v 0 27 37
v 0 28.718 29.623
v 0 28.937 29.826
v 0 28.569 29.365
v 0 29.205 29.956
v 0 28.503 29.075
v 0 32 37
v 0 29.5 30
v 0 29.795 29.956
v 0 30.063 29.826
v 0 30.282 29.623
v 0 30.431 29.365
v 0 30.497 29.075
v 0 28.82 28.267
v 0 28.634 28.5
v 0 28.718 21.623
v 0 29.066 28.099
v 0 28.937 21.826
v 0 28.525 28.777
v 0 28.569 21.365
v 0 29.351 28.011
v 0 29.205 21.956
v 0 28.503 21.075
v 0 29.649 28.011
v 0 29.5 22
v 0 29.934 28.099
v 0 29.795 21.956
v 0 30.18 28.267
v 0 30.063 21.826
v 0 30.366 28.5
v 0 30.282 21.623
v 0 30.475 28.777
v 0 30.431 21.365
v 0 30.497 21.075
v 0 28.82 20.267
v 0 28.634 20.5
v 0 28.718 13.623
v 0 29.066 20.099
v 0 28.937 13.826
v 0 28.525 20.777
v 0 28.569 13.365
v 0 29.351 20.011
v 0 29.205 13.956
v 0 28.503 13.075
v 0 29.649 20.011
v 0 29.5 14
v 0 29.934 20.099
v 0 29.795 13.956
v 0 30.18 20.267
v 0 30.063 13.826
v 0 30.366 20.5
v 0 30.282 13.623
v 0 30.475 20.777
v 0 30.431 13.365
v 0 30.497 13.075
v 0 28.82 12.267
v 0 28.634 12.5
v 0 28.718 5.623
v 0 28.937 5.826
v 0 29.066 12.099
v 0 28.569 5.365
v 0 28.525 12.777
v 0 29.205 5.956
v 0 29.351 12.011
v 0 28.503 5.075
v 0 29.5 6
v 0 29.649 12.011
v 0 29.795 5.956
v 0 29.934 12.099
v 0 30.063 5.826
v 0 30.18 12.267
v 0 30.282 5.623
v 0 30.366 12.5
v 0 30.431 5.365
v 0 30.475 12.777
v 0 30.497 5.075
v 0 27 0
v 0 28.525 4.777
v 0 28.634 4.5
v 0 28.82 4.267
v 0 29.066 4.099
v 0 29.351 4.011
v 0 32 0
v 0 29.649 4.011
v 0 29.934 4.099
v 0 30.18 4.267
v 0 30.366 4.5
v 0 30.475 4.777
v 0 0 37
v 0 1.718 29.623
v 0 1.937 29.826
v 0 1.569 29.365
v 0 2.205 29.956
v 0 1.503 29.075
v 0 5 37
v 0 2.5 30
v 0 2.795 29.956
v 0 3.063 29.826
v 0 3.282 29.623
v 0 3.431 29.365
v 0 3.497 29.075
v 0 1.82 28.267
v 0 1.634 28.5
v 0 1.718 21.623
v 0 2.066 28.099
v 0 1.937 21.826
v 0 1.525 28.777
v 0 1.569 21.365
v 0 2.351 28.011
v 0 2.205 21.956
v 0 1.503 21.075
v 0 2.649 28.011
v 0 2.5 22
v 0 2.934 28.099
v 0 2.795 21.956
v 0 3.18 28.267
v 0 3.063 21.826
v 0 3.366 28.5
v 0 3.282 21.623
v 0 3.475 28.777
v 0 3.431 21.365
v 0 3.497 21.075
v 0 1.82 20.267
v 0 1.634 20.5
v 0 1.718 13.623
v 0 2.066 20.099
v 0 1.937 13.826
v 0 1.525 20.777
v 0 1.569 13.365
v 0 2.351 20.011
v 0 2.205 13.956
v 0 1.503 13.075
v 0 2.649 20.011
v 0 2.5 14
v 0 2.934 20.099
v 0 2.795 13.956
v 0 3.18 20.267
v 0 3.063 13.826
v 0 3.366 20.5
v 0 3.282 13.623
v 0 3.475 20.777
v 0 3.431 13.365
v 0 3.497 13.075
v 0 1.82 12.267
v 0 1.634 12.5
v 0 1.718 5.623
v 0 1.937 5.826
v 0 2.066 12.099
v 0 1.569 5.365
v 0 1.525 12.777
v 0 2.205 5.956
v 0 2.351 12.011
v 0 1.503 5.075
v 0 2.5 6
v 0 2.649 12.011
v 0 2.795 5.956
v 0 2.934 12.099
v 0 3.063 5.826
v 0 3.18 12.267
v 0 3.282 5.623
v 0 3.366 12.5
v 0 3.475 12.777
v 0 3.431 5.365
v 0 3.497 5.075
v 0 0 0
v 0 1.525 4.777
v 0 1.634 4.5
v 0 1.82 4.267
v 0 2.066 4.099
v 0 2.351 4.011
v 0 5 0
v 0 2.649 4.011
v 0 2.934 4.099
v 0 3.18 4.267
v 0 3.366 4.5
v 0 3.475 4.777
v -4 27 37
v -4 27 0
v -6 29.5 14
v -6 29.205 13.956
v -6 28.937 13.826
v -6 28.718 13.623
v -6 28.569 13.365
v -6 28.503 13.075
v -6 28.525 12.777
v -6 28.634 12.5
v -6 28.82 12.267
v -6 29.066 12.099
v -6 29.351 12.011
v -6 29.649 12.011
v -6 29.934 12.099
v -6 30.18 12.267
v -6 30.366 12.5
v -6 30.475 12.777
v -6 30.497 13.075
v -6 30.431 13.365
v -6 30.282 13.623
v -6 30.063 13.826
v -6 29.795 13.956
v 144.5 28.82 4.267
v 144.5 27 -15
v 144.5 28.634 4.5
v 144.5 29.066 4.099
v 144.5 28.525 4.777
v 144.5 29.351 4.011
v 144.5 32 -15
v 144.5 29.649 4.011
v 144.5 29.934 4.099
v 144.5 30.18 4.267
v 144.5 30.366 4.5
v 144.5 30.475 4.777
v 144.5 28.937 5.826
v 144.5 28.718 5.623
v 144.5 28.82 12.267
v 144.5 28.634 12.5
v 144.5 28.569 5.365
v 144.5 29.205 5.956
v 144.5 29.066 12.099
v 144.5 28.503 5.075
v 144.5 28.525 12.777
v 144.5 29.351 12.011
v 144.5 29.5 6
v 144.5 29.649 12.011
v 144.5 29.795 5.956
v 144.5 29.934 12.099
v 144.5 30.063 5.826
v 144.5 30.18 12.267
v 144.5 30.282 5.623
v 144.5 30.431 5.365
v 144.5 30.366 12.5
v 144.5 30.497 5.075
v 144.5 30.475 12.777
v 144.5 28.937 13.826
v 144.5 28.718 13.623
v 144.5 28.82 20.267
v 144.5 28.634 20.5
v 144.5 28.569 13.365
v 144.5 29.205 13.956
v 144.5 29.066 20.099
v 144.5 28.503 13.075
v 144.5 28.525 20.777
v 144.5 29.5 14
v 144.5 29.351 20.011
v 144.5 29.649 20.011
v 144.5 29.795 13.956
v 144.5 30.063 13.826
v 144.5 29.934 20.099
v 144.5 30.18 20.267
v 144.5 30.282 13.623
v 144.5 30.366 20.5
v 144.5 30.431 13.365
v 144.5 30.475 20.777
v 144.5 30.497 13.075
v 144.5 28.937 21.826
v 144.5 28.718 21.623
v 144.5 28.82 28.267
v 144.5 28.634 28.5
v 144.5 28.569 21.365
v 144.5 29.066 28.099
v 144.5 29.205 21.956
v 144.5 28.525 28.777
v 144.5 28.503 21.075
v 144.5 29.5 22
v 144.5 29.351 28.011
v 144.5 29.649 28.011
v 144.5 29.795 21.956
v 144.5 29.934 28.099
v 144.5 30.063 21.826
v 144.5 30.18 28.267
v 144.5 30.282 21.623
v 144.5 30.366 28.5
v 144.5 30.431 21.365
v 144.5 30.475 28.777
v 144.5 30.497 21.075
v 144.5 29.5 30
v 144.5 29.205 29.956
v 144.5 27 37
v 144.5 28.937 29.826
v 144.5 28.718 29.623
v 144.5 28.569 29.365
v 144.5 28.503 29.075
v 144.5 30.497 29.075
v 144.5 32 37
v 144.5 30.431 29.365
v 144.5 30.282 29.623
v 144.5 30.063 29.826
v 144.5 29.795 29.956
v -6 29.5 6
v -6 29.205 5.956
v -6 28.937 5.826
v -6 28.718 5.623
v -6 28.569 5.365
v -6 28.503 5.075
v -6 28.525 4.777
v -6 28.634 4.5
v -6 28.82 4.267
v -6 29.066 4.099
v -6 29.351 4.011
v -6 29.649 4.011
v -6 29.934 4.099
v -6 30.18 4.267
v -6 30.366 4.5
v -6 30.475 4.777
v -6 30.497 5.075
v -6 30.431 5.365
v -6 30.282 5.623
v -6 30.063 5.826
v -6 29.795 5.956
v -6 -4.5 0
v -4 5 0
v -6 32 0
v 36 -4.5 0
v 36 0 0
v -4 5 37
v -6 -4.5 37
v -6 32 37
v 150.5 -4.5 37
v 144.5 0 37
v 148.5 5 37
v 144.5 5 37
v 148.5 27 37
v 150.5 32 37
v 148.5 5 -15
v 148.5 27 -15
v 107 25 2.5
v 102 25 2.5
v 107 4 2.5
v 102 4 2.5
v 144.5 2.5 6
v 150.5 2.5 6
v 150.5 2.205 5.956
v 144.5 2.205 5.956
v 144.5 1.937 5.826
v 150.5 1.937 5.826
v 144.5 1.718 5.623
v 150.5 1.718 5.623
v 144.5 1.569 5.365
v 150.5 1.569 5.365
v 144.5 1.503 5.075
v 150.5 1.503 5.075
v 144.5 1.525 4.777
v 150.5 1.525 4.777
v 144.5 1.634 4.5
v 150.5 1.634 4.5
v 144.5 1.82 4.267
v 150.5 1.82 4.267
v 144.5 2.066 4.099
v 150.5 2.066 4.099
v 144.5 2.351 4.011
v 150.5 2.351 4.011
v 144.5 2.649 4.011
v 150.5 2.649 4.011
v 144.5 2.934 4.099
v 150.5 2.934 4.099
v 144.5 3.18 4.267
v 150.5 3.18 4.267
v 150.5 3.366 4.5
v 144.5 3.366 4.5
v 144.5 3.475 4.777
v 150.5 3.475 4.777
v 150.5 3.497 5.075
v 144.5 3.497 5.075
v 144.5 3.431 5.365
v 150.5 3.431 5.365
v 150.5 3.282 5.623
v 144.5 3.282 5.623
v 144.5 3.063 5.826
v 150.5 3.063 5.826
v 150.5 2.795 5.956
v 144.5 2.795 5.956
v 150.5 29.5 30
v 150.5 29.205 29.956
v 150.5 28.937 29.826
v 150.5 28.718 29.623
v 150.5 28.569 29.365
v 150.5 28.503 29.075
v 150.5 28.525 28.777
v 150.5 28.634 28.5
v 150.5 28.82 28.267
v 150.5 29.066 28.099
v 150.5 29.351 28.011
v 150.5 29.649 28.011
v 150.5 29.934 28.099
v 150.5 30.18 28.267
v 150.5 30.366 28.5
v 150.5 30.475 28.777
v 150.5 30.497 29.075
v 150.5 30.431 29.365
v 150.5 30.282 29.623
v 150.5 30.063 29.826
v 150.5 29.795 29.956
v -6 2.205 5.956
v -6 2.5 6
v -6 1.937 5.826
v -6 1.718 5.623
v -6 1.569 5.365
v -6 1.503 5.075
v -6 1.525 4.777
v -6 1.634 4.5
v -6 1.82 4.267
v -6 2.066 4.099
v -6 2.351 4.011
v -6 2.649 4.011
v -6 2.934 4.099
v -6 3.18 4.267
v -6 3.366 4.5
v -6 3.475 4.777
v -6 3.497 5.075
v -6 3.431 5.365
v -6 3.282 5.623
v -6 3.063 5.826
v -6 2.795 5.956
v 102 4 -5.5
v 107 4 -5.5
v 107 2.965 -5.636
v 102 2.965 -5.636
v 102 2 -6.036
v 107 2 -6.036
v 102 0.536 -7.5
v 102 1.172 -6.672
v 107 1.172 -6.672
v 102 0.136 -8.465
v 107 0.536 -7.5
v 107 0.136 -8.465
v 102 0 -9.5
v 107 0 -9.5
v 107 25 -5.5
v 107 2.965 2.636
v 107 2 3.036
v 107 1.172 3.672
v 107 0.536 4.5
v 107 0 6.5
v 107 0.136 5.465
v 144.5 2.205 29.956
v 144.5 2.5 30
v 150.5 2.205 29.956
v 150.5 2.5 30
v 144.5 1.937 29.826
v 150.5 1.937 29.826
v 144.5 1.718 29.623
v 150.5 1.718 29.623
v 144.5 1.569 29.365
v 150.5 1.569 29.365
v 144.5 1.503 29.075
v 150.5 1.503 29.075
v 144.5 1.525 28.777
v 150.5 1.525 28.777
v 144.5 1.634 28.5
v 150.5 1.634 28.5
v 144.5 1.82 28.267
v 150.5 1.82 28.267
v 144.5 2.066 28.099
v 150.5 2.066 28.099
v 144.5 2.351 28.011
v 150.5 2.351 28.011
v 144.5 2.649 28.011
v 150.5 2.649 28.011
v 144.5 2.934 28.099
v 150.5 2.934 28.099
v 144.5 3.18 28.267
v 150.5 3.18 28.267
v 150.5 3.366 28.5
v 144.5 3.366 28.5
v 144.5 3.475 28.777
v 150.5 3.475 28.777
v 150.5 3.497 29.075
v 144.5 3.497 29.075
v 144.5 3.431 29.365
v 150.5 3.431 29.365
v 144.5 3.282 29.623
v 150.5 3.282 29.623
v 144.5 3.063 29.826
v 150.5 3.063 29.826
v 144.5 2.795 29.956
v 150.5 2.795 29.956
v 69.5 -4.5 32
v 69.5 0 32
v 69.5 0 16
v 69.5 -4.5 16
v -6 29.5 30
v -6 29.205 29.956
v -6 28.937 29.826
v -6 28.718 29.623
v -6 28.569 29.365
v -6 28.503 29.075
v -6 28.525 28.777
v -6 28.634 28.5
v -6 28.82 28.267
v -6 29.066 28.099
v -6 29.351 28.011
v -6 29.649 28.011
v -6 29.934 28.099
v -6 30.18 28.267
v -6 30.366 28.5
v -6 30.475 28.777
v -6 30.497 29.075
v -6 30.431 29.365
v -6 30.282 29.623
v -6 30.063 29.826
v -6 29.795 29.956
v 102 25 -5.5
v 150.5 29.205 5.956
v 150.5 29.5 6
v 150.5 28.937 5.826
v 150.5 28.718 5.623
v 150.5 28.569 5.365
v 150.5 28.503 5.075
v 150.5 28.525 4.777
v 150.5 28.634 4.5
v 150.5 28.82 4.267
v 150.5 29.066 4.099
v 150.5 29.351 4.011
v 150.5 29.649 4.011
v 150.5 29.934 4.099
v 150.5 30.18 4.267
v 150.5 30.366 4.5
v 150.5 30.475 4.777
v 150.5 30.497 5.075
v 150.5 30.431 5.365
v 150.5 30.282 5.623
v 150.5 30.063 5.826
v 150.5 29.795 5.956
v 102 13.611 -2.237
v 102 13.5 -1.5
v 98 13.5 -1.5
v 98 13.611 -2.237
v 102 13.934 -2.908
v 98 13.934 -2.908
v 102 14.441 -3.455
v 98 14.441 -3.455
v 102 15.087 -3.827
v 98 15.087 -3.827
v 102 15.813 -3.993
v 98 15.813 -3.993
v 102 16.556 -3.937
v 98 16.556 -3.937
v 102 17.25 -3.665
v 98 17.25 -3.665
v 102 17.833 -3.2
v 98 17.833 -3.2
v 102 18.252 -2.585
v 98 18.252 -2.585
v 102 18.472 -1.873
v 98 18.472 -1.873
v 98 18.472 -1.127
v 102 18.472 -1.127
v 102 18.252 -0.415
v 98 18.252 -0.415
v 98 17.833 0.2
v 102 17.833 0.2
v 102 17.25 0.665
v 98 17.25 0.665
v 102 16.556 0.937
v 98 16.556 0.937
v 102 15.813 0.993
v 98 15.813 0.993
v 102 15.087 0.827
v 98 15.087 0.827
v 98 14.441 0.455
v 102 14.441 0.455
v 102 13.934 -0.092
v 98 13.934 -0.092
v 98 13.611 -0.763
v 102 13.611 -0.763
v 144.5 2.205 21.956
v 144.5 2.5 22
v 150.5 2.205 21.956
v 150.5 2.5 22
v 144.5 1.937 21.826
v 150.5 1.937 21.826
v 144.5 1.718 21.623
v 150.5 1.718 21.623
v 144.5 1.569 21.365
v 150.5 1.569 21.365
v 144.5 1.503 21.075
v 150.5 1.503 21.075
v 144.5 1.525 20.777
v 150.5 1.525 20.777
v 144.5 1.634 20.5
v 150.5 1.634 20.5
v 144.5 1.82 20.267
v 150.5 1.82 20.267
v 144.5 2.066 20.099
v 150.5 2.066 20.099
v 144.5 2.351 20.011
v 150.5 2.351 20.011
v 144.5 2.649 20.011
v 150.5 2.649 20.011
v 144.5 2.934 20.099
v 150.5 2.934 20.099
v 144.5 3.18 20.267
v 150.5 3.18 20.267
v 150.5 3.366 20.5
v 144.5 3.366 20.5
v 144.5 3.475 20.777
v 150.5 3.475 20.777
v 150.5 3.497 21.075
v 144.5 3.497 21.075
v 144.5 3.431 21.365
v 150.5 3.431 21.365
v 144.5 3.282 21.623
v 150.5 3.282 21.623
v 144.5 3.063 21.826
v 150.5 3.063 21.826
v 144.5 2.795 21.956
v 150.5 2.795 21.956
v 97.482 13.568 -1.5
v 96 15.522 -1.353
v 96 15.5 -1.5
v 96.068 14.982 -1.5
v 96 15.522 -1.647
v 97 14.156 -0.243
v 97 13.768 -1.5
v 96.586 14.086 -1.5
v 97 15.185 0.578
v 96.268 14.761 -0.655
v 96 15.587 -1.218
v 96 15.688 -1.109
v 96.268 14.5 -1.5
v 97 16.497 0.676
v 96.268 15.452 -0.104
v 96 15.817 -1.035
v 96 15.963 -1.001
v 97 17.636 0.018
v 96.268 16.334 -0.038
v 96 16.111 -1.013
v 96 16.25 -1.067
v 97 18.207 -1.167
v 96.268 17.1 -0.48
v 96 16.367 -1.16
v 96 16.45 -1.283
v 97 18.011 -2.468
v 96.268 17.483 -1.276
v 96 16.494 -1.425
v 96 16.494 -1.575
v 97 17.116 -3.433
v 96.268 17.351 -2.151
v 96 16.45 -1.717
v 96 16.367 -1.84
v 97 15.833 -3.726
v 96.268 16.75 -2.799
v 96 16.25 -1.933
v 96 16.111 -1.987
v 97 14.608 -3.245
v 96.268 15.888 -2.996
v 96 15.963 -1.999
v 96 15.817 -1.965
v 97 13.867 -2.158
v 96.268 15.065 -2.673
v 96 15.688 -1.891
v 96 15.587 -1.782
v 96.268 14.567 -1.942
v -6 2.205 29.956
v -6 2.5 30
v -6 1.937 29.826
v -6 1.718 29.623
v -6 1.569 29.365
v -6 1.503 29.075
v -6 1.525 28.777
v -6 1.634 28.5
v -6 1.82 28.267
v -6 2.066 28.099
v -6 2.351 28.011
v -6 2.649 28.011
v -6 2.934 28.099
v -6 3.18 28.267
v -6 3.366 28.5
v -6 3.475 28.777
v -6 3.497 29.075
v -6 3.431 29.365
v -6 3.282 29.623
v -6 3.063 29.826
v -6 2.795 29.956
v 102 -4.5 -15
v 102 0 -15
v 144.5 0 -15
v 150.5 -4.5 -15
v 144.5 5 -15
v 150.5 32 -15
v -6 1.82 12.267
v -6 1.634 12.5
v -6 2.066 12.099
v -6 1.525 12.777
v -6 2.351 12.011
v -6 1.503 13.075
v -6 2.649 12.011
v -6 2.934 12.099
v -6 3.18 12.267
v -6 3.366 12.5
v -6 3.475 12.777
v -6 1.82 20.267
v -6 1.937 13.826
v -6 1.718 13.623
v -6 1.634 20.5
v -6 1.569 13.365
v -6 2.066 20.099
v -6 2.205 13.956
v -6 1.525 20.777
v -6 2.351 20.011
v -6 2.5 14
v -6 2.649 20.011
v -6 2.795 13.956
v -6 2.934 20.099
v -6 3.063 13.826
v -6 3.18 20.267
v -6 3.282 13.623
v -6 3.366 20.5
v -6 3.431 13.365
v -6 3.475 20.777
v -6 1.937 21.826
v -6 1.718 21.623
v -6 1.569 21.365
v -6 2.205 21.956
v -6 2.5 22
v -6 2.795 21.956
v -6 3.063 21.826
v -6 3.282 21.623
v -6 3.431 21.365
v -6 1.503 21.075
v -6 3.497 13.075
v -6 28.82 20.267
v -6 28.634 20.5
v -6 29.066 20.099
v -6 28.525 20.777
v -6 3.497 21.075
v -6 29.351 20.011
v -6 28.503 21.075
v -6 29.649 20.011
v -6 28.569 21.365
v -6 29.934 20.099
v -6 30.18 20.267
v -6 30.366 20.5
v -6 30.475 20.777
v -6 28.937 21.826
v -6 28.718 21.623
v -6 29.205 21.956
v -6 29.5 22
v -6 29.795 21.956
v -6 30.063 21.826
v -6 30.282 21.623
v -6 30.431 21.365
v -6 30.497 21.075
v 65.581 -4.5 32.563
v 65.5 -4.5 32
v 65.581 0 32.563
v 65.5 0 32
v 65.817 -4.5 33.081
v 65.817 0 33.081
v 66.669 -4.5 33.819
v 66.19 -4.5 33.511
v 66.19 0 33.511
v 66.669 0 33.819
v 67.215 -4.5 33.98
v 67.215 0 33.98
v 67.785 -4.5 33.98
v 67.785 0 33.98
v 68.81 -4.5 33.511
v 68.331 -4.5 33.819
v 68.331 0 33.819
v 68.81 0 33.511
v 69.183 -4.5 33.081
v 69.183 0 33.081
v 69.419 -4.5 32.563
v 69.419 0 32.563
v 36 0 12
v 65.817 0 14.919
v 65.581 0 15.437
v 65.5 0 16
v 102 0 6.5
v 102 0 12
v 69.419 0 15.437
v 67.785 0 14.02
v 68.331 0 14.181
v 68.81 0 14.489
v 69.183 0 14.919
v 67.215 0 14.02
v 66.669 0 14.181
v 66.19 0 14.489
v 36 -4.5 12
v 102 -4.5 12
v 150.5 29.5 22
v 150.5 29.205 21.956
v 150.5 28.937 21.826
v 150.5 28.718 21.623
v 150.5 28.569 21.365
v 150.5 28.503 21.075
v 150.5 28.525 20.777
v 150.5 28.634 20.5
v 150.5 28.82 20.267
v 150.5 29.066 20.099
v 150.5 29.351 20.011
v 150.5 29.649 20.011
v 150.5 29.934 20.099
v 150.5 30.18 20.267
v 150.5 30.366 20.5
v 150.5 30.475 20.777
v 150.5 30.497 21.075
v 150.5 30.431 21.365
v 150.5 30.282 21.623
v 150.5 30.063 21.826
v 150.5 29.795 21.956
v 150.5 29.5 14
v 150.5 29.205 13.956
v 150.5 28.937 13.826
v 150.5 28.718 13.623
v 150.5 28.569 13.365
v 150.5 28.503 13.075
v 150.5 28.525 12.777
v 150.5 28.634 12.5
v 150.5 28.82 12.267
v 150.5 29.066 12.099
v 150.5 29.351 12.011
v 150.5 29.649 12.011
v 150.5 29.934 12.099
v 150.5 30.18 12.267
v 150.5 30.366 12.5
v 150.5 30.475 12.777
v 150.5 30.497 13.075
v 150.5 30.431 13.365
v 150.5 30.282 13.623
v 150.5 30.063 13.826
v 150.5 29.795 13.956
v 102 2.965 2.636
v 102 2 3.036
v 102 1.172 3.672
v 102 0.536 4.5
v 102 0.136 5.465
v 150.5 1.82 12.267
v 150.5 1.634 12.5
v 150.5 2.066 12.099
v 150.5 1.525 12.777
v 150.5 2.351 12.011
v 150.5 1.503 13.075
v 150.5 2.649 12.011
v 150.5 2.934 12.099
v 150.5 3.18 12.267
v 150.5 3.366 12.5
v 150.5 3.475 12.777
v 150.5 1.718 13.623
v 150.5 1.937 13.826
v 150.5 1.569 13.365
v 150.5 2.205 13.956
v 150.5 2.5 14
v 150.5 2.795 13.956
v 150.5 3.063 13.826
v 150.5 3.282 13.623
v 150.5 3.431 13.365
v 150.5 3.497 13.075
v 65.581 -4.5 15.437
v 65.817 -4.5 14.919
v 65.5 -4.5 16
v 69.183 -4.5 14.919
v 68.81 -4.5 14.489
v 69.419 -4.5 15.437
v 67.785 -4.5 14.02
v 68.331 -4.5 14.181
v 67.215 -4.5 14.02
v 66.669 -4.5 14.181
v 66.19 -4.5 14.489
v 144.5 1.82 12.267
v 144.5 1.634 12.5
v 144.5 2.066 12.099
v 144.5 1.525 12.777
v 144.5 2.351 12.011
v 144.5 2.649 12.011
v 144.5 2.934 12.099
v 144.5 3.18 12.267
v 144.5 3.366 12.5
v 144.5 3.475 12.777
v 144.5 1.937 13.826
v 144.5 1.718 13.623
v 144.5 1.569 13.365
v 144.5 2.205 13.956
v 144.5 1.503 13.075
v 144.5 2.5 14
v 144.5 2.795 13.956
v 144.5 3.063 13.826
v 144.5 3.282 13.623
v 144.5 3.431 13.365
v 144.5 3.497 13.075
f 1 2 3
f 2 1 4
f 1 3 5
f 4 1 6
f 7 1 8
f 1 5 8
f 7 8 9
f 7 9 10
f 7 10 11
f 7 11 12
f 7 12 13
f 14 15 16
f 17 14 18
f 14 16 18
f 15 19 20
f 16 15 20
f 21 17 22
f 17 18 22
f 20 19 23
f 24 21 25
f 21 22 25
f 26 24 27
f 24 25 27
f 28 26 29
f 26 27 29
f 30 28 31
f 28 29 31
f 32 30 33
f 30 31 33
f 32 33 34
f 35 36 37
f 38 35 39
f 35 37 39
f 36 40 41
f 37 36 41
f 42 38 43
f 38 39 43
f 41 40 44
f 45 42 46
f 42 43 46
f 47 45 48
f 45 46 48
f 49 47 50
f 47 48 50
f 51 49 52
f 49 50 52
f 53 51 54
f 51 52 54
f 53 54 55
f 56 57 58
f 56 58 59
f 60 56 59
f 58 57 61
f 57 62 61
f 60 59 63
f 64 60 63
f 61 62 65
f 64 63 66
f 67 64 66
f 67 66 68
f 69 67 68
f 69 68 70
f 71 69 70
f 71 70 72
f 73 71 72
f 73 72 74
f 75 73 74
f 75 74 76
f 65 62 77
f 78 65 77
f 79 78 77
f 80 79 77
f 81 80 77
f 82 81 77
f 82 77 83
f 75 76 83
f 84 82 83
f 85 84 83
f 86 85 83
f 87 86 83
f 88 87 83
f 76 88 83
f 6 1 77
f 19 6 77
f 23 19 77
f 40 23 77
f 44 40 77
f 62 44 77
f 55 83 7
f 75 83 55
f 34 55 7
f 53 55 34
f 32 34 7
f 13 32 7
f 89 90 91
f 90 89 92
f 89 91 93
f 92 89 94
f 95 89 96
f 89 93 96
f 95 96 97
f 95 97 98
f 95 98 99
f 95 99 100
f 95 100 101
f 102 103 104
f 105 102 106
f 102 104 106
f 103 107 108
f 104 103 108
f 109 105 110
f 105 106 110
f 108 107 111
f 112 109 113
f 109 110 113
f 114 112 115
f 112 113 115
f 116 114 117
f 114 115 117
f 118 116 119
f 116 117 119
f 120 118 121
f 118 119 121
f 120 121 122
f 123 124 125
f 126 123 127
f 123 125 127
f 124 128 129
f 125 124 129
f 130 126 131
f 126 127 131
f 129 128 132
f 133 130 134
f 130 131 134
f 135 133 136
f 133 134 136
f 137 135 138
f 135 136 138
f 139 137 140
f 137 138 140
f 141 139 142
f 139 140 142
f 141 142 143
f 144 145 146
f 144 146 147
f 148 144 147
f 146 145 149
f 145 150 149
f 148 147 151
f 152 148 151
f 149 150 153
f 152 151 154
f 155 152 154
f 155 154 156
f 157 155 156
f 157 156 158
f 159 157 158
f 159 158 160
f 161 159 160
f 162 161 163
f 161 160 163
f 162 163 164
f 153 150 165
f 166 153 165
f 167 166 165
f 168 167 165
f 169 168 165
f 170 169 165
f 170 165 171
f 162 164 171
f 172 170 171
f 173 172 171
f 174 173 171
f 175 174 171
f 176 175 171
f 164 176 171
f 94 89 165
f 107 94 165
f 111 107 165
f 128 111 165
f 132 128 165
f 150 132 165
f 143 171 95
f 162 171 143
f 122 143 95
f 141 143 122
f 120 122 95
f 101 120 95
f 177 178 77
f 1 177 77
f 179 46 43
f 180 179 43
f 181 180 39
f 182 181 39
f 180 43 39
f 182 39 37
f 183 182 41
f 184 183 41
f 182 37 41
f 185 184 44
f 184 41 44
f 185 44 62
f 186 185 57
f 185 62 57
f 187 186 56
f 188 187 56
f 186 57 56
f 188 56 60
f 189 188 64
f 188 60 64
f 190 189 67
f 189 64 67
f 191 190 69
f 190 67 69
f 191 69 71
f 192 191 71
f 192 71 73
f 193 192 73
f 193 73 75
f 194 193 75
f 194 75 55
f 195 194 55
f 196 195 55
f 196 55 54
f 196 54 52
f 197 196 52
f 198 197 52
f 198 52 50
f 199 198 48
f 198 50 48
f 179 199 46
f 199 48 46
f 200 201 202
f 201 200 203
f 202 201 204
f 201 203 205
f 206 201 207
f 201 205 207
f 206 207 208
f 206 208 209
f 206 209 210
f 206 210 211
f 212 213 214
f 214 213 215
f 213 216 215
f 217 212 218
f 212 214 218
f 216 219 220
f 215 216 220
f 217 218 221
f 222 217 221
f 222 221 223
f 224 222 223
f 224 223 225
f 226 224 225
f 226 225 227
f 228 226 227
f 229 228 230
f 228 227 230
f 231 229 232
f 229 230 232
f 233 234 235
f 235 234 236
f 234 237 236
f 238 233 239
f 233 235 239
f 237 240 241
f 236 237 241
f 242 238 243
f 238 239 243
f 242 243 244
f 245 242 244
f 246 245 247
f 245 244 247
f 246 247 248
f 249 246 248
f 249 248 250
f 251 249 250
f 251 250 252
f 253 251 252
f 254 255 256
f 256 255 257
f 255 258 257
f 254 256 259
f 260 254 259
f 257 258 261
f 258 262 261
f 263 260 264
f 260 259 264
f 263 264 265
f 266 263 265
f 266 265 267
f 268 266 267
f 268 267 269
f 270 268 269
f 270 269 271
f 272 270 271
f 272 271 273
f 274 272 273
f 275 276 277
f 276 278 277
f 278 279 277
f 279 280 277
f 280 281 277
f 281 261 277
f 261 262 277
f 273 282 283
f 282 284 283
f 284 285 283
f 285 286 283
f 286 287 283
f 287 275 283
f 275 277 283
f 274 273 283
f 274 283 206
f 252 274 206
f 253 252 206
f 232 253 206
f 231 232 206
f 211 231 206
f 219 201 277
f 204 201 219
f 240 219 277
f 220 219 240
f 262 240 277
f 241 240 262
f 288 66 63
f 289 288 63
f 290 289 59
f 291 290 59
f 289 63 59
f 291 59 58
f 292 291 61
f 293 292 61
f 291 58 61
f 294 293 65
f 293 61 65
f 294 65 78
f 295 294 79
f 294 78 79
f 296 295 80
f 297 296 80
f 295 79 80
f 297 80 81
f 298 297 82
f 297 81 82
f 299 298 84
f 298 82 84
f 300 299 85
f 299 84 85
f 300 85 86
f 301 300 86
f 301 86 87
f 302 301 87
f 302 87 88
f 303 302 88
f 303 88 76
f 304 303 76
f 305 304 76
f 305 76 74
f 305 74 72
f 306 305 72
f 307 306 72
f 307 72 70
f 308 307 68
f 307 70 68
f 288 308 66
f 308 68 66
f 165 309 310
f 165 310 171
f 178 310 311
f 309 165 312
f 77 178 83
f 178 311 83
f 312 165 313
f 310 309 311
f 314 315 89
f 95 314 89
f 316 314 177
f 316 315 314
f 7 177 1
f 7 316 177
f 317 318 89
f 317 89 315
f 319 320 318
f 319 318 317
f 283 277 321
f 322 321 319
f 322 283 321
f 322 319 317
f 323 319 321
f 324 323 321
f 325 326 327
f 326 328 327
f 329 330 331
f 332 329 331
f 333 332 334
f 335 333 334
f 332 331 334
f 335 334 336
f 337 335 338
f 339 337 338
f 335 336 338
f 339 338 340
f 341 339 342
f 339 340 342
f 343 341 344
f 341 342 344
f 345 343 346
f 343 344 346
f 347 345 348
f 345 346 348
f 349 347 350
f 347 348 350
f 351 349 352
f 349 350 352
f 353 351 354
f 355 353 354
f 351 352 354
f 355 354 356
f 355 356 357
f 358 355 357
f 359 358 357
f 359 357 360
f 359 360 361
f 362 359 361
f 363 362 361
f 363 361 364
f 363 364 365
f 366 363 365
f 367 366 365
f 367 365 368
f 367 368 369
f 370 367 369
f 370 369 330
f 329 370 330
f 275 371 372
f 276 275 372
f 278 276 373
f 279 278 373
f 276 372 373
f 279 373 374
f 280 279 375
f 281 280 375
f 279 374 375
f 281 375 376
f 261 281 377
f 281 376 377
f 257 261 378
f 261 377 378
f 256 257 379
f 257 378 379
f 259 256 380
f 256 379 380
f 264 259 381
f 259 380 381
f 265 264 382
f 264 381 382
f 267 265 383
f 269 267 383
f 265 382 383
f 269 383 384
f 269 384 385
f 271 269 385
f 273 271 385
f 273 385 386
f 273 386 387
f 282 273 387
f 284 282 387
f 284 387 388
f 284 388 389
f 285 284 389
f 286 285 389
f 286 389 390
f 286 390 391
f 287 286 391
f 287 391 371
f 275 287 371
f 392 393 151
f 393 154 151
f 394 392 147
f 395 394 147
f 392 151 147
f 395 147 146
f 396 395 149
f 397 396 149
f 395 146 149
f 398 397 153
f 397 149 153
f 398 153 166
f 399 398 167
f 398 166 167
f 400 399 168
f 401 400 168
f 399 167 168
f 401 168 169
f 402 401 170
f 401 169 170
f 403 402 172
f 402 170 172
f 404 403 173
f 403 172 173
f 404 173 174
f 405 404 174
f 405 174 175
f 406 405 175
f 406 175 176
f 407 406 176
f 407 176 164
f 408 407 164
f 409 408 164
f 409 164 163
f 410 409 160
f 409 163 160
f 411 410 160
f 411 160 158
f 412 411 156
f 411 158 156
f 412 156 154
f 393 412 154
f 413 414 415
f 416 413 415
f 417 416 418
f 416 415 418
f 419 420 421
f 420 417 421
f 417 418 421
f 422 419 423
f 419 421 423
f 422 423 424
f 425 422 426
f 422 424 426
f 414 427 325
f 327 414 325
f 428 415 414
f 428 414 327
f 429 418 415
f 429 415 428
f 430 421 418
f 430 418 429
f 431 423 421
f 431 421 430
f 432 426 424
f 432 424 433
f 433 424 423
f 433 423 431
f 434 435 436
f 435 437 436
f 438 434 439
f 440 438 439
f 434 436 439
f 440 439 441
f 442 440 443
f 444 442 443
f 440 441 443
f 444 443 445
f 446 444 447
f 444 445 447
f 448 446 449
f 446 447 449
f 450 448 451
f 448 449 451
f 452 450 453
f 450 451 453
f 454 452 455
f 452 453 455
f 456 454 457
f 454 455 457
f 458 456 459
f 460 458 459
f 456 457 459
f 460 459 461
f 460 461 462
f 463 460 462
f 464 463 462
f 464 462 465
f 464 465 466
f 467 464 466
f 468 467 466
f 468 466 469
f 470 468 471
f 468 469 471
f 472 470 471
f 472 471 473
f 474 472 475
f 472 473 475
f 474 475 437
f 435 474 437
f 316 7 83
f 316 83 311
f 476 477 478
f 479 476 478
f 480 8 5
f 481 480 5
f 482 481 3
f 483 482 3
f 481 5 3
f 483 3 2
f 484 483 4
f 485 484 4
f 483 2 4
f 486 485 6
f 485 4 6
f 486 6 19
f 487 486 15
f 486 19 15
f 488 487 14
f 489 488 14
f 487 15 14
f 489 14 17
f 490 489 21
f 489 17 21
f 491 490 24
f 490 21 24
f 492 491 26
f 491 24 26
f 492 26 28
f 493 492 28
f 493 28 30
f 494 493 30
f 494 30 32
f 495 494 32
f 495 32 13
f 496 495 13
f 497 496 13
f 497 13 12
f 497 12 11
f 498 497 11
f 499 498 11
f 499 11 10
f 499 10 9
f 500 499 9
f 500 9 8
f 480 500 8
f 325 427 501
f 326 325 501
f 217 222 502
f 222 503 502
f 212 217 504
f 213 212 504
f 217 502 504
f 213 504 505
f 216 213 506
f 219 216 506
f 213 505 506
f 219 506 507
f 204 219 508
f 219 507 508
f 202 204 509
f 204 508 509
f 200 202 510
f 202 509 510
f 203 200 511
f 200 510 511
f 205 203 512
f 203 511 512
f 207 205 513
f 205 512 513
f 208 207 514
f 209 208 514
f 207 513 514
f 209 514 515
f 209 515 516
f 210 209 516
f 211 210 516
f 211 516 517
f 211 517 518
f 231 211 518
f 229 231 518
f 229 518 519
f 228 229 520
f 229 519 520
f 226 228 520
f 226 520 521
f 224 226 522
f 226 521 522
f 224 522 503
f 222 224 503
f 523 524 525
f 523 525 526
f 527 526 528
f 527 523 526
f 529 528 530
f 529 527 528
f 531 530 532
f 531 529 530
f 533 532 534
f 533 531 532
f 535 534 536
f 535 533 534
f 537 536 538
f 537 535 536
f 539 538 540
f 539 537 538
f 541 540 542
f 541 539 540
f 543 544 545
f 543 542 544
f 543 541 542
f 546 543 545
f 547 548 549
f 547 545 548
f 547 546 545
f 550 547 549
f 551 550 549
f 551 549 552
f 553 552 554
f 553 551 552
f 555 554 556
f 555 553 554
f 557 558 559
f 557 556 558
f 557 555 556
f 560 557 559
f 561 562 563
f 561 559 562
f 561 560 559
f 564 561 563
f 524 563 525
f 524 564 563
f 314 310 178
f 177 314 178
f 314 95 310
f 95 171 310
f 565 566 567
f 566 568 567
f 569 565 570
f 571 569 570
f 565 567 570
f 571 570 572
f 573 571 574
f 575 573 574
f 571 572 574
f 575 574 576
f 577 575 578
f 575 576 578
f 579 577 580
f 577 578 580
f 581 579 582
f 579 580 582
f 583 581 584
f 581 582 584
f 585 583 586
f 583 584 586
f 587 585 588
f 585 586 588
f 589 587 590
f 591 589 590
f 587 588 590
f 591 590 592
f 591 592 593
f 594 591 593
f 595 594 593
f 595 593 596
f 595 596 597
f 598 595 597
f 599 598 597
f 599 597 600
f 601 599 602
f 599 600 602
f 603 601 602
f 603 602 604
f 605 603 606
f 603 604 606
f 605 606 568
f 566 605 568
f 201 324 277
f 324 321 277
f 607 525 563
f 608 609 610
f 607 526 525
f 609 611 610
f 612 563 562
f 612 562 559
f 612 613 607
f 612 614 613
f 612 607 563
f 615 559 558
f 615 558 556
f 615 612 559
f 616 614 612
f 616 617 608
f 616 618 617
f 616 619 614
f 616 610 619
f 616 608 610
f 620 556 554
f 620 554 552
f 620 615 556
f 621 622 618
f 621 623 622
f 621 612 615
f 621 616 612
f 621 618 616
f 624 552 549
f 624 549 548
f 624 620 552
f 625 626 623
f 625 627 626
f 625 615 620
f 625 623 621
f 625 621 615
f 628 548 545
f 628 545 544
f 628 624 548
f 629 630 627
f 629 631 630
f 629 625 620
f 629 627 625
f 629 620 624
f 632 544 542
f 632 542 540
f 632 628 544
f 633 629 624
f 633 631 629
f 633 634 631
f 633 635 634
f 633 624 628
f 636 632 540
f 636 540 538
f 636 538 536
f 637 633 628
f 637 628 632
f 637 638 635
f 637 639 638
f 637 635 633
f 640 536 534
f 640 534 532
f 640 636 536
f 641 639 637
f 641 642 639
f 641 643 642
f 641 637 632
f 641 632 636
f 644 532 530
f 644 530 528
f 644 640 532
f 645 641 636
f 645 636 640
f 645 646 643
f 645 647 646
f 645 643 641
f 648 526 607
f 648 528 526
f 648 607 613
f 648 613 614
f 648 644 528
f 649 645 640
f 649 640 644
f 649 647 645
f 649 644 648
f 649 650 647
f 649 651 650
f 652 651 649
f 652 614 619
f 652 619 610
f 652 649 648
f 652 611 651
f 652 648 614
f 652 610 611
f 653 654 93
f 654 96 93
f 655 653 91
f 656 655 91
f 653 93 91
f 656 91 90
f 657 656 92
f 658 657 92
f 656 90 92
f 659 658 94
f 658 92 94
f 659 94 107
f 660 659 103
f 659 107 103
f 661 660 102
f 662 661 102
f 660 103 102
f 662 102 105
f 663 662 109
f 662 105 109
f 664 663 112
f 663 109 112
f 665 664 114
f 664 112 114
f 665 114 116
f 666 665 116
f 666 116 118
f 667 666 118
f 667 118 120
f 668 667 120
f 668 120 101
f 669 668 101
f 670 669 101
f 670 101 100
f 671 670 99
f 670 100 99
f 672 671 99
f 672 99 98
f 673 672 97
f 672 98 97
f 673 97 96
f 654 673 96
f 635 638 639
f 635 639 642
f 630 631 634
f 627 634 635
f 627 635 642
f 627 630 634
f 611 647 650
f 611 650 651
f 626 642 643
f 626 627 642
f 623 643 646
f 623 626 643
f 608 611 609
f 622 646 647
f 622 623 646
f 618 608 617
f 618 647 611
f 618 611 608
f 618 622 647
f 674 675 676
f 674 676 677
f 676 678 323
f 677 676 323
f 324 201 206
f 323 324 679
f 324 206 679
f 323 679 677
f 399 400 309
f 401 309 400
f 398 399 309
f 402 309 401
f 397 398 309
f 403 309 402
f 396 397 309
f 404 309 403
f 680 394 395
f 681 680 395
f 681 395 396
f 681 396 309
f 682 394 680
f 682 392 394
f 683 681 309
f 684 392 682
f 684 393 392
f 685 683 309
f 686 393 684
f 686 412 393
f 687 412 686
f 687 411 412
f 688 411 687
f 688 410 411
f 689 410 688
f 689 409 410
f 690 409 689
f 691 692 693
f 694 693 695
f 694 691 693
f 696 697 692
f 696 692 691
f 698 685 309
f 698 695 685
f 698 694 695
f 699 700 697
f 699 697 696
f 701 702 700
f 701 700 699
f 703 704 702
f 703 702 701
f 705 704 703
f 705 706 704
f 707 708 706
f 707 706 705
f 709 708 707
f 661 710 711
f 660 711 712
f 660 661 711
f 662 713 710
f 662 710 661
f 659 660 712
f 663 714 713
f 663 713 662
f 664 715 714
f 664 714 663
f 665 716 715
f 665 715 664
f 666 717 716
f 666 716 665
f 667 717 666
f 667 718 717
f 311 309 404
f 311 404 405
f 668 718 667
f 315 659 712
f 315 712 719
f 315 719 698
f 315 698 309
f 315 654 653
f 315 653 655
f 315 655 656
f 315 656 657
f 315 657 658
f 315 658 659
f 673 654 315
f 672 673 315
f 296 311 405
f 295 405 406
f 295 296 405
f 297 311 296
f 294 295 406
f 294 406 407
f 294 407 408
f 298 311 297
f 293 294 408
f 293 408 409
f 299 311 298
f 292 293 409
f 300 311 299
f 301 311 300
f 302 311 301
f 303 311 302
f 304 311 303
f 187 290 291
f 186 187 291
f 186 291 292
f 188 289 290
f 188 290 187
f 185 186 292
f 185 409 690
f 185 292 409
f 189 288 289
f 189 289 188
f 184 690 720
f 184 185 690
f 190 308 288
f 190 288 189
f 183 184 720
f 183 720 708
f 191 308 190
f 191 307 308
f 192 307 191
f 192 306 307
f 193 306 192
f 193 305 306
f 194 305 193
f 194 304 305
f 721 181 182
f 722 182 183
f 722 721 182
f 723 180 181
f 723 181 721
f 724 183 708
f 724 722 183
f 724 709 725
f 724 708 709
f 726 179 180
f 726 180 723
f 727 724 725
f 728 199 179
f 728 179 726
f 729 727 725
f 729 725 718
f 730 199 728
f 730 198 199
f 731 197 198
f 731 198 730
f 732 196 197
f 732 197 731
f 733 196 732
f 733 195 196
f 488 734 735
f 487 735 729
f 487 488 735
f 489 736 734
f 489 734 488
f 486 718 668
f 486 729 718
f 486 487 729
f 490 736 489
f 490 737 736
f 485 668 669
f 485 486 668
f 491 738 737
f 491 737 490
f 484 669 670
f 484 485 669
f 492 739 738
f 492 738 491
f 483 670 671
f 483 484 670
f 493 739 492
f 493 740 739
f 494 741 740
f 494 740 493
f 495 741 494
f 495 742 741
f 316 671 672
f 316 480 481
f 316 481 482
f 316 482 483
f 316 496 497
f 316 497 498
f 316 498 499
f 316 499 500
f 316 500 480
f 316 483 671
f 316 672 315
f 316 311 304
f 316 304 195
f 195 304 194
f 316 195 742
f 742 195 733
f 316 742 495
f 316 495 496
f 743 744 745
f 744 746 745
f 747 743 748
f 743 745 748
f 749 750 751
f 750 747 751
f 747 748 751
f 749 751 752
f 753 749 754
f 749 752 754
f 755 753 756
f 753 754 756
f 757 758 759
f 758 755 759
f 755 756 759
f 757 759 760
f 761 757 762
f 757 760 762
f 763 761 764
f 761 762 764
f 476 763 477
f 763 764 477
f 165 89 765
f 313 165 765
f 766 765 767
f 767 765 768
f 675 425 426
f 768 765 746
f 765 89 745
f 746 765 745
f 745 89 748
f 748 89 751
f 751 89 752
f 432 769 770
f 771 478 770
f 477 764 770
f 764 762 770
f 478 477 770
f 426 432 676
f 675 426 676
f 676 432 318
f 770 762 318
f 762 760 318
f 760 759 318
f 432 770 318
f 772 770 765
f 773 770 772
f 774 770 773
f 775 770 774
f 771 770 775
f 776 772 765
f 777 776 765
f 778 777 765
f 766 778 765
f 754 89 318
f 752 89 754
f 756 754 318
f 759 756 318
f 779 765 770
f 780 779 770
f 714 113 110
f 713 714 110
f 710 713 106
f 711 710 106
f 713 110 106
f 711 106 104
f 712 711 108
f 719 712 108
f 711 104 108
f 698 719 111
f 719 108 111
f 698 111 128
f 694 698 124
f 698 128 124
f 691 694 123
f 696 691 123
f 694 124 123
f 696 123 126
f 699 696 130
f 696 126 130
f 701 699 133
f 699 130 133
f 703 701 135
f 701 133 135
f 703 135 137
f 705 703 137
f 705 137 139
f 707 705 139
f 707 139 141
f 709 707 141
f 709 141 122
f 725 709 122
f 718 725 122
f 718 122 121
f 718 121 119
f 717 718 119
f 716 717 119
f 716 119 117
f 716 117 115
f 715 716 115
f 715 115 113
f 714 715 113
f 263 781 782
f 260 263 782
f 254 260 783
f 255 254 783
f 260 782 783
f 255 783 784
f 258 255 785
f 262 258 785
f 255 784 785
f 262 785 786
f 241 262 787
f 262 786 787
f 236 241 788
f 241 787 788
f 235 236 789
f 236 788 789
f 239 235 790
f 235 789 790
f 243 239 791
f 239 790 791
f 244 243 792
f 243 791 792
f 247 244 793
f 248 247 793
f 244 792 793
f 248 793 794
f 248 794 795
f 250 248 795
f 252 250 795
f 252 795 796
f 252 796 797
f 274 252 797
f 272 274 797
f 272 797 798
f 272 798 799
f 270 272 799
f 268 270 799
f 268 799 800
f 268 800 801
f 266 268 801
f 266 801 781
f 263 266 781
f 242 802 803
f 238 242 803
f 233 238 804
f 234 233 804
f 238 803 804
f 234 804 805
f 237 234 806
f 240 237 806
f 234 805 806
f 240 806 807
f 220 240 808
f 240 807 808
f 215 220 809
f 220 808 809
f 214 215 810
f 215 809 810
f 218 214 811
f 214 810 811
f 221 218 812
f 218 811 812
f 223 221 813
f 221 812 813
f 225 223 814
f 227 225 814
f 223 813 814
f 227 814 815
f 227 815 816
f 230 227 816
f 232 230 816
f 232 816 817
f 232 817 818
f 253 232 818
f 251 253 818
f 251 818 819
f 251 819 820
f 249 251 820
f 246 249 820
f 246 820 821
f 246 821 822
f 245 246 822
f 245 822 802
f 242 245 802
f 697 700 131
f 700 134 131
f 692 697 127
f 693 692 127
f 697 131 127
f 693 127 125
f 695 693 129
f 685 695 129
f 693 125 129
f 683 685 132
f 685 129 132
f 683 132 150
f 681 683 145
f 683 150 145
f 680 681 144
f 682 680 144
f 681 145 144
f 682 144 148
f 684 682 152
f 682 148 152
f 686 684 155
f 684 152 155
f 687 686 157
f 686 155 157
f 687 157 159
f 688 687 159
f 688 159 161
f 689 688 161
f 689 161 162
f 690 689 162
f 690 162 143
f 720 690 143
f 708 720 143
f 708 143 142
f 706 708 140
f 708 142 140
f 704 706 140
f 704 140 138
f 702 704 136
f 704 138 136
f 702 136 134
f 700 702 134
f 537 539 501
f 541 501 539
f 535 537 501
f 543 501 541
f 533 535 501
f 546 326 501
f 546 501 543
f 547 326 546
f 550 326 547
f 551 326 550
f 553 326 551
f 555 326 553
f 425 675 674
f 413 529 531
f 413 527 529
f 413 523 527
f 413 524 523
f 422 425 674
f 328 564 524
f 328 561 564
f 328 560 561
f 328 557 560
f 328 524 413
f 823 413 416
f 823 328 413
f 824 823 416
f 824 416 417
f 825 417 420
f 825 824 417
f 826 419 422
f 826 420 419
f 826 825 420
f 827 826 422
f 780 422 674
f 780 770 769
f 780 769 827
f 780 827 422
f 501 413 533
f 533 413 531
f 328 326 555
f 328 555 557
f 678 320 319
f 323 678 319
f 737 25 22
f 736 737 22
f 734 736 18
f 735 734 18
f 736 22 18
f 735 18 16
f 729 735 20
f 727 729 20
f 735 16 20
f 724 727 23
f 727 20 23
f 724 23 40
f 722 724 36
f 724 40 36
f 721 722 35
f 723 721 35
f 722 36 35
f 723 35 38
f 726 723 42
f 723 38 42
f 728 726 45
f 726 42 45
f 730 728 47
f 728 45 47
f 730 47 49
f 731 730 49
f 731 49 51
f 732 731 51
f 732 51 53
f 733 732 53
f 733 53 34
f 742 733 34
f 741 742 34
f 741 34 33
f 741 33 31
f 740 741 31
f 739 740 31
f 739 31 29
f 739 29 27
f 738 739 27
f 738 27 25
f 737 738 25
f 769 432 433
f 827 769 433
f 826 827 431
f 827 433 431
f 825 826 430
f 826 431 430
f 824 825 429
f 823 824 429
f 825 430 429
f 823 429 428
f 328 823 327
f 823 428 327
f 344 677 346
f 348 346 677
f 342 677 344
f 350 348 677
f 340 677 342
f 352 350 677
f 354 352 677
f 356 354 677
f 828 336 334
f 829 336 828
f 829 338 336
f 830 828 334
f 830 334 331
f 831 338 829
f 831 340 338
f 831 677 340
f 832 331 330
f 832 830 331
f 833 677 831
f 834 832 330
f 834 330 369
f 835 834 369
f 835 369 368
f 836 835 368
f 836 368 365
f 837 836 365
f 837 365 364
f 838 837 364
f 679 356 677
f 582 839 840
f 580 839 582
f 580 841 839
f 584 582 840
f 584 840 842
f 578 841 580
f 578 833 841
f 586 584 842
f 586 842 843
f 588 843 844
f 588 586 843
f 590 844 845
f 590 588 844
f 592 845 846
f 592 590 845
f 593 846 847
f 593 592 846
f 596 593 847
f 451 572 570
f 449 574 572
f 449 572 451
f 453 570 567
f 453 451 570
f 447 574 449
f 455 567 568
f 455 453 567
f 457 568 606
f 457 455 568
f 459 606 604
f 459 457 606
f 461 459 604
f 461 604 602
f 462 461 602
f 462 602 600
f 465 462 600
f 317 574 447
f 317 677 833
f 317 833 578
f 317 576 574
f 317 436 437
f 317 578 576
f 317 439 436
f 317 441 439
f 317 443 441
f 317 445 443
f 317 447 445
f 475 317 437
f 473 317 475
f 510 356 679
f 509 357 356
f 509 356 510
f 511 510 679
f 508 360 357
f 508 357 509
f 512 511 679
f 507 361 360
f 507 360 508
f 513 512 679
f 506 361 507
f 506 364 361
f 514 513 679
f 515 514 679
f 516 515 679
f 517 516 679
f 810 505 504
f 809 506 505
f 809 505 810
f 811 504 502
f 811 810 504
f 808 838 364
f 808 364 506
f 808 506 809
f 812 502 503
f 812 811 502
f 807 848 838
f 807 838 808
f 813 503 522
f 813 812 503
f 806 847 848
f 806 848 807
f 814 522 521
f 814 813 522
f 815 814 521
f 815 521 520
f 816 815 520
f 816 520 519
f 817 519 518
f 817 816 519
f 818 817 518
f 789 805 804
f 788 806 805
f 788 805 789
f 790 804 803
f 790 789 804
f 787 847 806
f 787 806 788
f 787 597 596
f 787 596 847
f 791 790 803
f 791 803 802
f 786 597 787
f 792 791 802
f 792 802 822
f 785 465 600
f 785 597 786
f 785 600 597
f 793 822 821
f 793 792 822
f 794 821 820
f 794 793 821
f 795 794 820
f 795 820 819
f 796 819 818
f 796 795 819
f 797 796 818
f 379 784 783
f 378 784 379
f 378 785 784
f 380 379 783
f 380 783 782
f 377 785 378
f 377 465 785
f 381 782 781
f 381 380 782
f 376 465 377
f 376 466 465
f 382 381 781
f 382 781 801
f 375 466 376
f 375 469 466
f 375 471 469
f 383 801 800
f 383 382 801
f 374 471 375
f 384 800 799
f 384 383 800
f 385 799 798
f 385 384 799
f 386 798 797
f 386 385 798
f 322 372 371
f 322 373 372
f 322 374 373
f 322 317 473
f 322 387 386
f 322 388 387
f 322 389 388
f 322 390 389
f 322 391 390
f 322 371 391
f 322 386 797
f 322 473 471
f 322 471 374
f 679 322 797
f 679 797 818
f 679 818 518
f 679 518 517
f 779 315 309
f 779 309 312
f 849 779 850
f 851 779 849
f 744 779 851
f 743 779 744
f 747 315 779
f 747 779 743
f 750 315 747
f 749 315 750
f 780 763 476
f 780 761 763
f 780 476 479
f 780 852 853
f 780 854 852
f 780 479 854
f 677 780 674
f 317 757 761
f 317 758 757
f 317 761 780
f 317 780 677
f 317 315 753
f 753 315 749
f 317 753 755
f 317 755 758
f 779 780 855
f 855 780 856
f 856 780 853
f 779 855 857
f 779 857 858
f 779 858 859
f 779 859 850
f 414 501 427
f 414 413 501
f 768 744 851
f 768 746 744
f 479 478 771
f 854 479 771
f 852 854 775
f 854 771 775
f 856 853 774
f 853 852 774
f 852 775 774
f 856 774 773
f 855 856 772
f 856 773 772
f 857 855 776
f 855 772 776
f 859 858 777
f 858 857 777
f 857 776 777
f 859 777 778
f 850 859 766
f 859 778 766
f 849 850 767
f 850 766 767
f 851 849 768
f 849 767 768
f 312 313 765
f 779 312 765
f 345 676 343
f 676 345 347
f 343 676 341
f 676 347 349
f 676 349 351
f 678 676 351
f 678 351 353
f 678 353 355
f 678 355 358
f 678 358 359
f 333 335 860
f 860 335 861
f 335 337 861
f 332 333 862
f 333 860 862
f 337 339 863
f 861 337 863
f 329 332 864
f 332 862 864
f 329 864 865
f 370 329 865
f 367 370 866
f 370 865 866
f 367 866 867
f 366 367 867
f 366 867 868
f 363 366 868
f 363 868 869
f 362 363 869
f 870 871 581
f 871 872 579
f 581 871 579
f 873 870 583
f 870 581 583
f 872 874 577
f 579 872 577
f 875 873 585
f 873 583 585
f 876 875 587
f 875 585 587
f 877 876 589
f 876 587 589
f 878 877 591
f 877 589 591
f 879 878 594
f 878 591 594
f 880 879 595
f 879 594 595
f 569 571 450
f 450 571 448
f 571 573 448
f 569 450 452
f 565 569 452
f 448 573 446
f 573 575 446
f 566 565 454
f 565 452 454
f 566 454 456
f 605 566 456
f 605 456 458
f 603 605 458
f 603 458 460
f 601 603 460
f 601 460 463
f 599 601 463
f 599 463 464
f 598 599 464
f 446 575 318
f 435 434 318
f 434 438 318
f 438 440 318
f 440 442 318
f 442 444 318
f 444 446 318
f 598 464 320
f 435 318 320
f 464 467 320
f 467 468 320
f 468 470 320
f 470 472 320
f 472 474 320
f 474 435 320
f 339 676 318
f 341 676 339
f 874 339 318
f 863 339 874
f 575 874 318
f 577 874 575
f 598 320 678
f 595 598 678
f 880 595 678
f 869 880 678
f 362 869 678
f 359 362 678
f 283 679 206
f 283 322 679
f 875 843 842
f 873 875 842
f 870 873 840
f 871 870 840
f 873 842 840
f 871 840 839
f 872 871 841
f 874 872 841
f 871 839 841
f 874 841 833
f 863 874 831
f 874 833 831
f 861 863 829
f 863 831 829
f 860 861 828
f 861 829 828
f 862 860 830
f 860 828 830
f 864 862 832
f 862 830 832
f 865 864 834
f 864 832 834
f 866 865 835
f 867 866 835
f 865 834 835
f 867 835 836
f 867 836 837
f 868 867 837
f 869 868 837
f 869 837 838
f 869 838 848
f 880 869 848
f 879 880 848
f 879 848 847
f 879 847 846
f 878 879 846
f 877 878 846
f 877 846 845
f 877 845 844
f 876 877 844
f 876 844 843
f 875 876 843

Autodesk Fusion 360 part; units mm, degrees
sketch "Sketch1" plane through (0, 0, 0) normal (0, 0, 1) x (1, 0, 0)
  line L0 (0, 0) -> (144.5, 0)
  line L1 (0, 0) -> (0, 5)
  line L2 (144.5, 0) -> (144.5, 5)
  line L3 (0, 5) -> (-4, 5)
  line L4 (144.5, 5) -> (148.5, 5)
  line L5 (-4, 5) -> (-4, 27)
  line L6 (-4, 27) -> (0, 27)
  line L7 (0, 27) -> (0, 32)
  line L8 (148.5, 5) -> (148.5, 27)
  line L9 (148.5, 27) -> (144.5, 27)
  line L10 (144.5, 27) -> (144.5, 32)
  line L11 (0, 32) -> (-6, 32)
  line L12 (-6, 32) -> (-6, -3)
  line L13 (-6, -3) -> (150.5, -3)
  line L14 (150.5, -3) -> (150.5, 32)
  line L15 (150.5, 32) -> (144.5, 32)
  dimension "d2" = 5
  dimension "d3" = 5
  dimension "d4" = 4
  dimension "d5" = 4
  dimension "d6" = 22
  dimension "d7" = 22
  dimension "d8" = 5
  dimension "d10" = 6
  dimension "d11" = 35
  dimension "d12" = 156.5
  dimension "d13" = 35
  dimension "d83" = 2
  dimension "d84" = 2
  dimension "d85" = 6
  dimension "d86" = 6
  dimension "d87" = 6
extrude "Extrude1" add sketch "Sketch1" along normal blind 37
sketch "Sketch2" plane through (-6, 0, 0) normal (-1, 0, 0) x (0, -1, 0)
  line L0 (-32, 0) -> (3, 0)
  line L1 (3, 0) -> (3, 37)
  line L2 (3, 37) -> (-32, 37)
  line L3 (-32, 37) -> (-32, 0)
  line L4 (-27, 37) -> (-32, 37)
  circle A0 centre (-29.5, 5) radius 1
  circle A1 centre (-29.5, 13) radius 1
  circle A2 centre (-29.5, 21) radius 1
  circle A3 centre (-29.5, 29) radius 1
  circle A4 centre (-2.5, 29) radius 1
  circle A5 centre (-2.5, 21) radius 1
  circle A6 centre (-2.5, 13) radius 1
  circle A7 centre (-2.5, 5) radius 1
  dimension "d18" = 2
  dimension "d19" = 2
  dimension "d21" = 2
  dimension "d22" = 8
  dimension "d24" = 8
  dimension "d25" = 2
  dimension "d26" = 8
hole "Hole2" at (-6, 2.5, 29) at (-6, 2.5, 21) at (-6, 2.5, 13) at (-6, 2.5, 5) direction (1, 0, 0) diameter 2 depth 80 tip angle 118
hole "Hole3" at (-6, 29.5, 29) direction (1, 0, 0) diameter 2 depth 280 tip angle 118
hole "Hole4" at (-6, 29.5, 21) at (-6, 29.5, 13) at (-6, 29.5, 5) at (-6, 2.5, 29) at (-6, 2.5, 21) at (-6, 2.5, 13) at (-6, 2.5, 5) direction (1, 0, 0) diameter 2 depth 245 tip angle 118
sketch "Sketch3" plane through (0, -3, 0) normal (0, -1, 0) x (1, 0, 0)
  line L0 (-6, 0) -> (150.5, 0)
  line L1 (150.5, 0) -> (150.5, 37)
  line L2 (150.5, 37) -> (-6, 37)
  line L3 (-6, 37) -> (-6, 0)
  line L4 (36, 0) -> (36, 12)
  line L5 (36, 12) -> (102, 12)
  line L6 (102, 12) -> (102, 0)
  line L7 (36, 0) -> (102, 0)
  line L8 (-6, 0) -> (-6, 37)
  dimension "d45" = 12
  dimension "d79" = 12
  dimension "d81" = 42
  dimension "d82" = 66
extrude "Extrude2" cut sketch "Sketch3" against normal blind 9 contours L0 L4 L5 L6 L7
sketch "Sketch4" plane through (150.5, 0, 0) normal (1, 0, 0) x (0, 1, 0)
  line L0 (-3, 0) -> (32, 0)
  line L1 (32, 0) -> (32, 37)
  line L2 (32, 37) -> (-3, 37)
  line L3 (-3, 37) -> (-3, 0)
  circle A0 centre (14.5, 44) radius 2.1
  line L4 (14.5, 49.1) -> (10, 49.1)
  line L5 (10, 49.1) -> (10, 37)
  line L6 (19, 49.1) -> (19, 37)
  line L7 (19, 37) -> (14.5, 37)
  line L8 (19, 49.1) -> (14.5, 49.1)
  circle A1 centre (2.5, 13) radius 1
  circle A2 centre (2.5, 29) radius 1
  circle A3 centre (29.5, 13) radius 1
  circle A4 centre (29.5, 21) radius 1
  circle A5 centre (29.5, 5) radius 1
  circle A6 centre (2.5, 21) radius 1
  circle A7 centre (2.5, 5) radius 1
  circle A8 centre (29.5, 29) radius 1
  dimension "d46" = 17.5
  dimension "d47" = 7
  dimension "d48" = 4.2
sketch "Sketch5" plane through (150.5, 0, 0) normal (1, 0, 0) x (0, 1, 0)
  line L0 (32, 37) -> (-3, 37)
  line L1 (-3, 37) -> (-3, 0)
  line L2 (-3, 0) -> (32, 0)
  line L3 (32, 0) -> (32, 37)
  line L4 (6.9, 0) -> (6.9, 10)
  line L5 (22.1, 0) -> (22.1, 37)
  line L6 (22.1, 0) -> (24.1, 0)
  line L7 (24.1, 0) -> (24.1, 37)
  line L8 (6.9, 0) -> (4.9, 0)
  line L9 (4.9, 0) -> (4.927, 10.0053)
  line L10 (6.9, 0) -> (6.9, 10)
  line L11 (6.9, 10) -> (4.9, 10.0054)
  circle A0 centre (2.5, 13) radius 1
  circle A1 centre (2.5, 29) radius 1
  circle A2 centre (29.5, 13) radius 1
  circle A3 centre (29.5, 21) radius 1
  circle A4 centre (29.5, 5) radius 1
  circle A5 centre (2.5, 21) radius 1
  circle A6 centre (2.5, 5) radius 1
  circle A7 centre (29.5, 29) radius 1
  point P0 (5, 37)
  point P1 (5, 37)
  dimension "d54" = 9.9
  dimension "d55" = 9.9
  dimension "d56" = 2
  dimension "d57" = 2
  dimension "d60" = 10
  dimension "d61" = 2
ref_plane "WorkPlane1" through (102.5, 14.5, 18.5) normal (1, 0, 0) x (0, 1, 0)
sketch "Sketch7" plane through (0, -3, 0) normal (0, -1, 0) x (1, 0, 0)
  line L0 (36, 0) -> (36, 12)
  line L1 (36, 12) -> (102, 12)
  line L2 (102, 12) -> (102, 0)
  line L3 (102, 0) -> (150.5, 0)
  line L4 (150.5, 0) -> (150.5, 37)
  line L5 (150.5, 37) -> (-6, 37)
  line L6 (-6, 37) -> (-6, 0)
  line L7 (-6, 0) -> (36, 0)
  line L8 (65.5, 32) -> (65.5, 16)
  line L9 (69.5, 32) -> (69.5, 16)
  arc A0 (69.5, 32) -> (65.5, 32) centre (67.5, 32) ccw
  arc A1 (65.5, 16) -> (69.5, 16) centre (67.5, 16) ccw
  dimension "d71" = 4
  dimension "d74" = 4
  dimension "d76" = 2
  dimension "d88" = 71.5
  dimension "d89" = 4
extrude "Extrude7" cut sketch "Sketch7" against normal blind 13 contours L8 L9 A0 A1
extrude "Extrude8" add 1 faces at (134.3333, -3, 16.3333) along direction (0, -1, 0) blind 1.5
extrude "Extrude9" add 1 faces at (132.3333, -3, 0) along direction (0, 0, -1) blind 15
sketch "Sketch8" plane through (0, 0, 0) normal (0, 1, 0) x (-1, 0, 0)
  line L0 (-65.5, 32) -> (-65.5, 16)
  arc A0 (-69.5, 16) -> (-65.5, 16) centre (-67.5, 16) ccw
  line L1 (-69.5, 16) -> (-69.5, 32)
  arc A1 (-65.5, 32) -> (-69.5, 32) centre (-67.5, 32) ccw
  line L2 (-36, 12) -> (-36, 0)
  line L3 (-36, 0) -> (0, 0)
  line L4 (0, 0) -> (0, 37)
  line L5 (0, 37) -> (-144.5, 37)
  line L6 (-144.5, 37) -> (-144.5, -15)
  line L7 (-144.5, -15) -> (-102, -15)
  line L8 (-102, -15) -> (-102, 12)
  line L9 (-102, 12) -> (-36, 12)
  line L10 (-102, 2.5) -> (-107, 2.5)
  line L11 (-102, -5.5) -> (-107, -5.5)
  line L12 (-107, -5.5) -> (-107, 2.5)
  line L13 (-102, 2.5) -> (-102, -5.5)
  dimension "d97" = 5
  dimension "d100" = 8
  dimension "d101" = 8
  dimension "d102" = 9.5
extrude "Extrude10" add sketch "Sketch8" along normal blind 25 contours L8 L10 L11 L12 L13
sketch "Sketch10" plane through (102, 0, 0) normal (-1, 0, 0) x (0, -1, 0)
  line L0 (0, -5.5) -> (0, -15)
  line L1 (0, -15) -> (4.5, -15)
  line L2 (4.5, -15) -> (4.5, 12)
  line L3 (4.5, 12) -> (0, 12)
  line L4 (0, 12) -> (0, 2.5)
  line L5 (0, 2.5) -> (-25, 2.5)
  line L6 (-25, 2.5) -> (-25, -5.5)
  line L7 (-25, -5.5) -> (0, -5.5)
  circle A0 centre (-16, -1.5) radius 2.5
  dimension "d107" = 5
  dimension "d108" = 9
extrude "Extrude12" add sketch "Sketch10" along normal blind 6 contours A0
fillet "Fillet4" radius 2 1 edges at (96, 18.3308, -2.404)
fillet "Fillet5" radius 4 2 edges at (104.5, 0, -5.5) (104.5, 0, 2.5)
equation "d11 = 32.00 mm + 3 mm"
equation "d12 = 96 mm + 10.5 mm + 50 mm"
equation "d46 = ( 35 / 2 ) * 1 mm"
equation "d64 = ( -96 / 2 ) * 1 mm"
equation "d88 = 46.50 mm + 25 mm"
